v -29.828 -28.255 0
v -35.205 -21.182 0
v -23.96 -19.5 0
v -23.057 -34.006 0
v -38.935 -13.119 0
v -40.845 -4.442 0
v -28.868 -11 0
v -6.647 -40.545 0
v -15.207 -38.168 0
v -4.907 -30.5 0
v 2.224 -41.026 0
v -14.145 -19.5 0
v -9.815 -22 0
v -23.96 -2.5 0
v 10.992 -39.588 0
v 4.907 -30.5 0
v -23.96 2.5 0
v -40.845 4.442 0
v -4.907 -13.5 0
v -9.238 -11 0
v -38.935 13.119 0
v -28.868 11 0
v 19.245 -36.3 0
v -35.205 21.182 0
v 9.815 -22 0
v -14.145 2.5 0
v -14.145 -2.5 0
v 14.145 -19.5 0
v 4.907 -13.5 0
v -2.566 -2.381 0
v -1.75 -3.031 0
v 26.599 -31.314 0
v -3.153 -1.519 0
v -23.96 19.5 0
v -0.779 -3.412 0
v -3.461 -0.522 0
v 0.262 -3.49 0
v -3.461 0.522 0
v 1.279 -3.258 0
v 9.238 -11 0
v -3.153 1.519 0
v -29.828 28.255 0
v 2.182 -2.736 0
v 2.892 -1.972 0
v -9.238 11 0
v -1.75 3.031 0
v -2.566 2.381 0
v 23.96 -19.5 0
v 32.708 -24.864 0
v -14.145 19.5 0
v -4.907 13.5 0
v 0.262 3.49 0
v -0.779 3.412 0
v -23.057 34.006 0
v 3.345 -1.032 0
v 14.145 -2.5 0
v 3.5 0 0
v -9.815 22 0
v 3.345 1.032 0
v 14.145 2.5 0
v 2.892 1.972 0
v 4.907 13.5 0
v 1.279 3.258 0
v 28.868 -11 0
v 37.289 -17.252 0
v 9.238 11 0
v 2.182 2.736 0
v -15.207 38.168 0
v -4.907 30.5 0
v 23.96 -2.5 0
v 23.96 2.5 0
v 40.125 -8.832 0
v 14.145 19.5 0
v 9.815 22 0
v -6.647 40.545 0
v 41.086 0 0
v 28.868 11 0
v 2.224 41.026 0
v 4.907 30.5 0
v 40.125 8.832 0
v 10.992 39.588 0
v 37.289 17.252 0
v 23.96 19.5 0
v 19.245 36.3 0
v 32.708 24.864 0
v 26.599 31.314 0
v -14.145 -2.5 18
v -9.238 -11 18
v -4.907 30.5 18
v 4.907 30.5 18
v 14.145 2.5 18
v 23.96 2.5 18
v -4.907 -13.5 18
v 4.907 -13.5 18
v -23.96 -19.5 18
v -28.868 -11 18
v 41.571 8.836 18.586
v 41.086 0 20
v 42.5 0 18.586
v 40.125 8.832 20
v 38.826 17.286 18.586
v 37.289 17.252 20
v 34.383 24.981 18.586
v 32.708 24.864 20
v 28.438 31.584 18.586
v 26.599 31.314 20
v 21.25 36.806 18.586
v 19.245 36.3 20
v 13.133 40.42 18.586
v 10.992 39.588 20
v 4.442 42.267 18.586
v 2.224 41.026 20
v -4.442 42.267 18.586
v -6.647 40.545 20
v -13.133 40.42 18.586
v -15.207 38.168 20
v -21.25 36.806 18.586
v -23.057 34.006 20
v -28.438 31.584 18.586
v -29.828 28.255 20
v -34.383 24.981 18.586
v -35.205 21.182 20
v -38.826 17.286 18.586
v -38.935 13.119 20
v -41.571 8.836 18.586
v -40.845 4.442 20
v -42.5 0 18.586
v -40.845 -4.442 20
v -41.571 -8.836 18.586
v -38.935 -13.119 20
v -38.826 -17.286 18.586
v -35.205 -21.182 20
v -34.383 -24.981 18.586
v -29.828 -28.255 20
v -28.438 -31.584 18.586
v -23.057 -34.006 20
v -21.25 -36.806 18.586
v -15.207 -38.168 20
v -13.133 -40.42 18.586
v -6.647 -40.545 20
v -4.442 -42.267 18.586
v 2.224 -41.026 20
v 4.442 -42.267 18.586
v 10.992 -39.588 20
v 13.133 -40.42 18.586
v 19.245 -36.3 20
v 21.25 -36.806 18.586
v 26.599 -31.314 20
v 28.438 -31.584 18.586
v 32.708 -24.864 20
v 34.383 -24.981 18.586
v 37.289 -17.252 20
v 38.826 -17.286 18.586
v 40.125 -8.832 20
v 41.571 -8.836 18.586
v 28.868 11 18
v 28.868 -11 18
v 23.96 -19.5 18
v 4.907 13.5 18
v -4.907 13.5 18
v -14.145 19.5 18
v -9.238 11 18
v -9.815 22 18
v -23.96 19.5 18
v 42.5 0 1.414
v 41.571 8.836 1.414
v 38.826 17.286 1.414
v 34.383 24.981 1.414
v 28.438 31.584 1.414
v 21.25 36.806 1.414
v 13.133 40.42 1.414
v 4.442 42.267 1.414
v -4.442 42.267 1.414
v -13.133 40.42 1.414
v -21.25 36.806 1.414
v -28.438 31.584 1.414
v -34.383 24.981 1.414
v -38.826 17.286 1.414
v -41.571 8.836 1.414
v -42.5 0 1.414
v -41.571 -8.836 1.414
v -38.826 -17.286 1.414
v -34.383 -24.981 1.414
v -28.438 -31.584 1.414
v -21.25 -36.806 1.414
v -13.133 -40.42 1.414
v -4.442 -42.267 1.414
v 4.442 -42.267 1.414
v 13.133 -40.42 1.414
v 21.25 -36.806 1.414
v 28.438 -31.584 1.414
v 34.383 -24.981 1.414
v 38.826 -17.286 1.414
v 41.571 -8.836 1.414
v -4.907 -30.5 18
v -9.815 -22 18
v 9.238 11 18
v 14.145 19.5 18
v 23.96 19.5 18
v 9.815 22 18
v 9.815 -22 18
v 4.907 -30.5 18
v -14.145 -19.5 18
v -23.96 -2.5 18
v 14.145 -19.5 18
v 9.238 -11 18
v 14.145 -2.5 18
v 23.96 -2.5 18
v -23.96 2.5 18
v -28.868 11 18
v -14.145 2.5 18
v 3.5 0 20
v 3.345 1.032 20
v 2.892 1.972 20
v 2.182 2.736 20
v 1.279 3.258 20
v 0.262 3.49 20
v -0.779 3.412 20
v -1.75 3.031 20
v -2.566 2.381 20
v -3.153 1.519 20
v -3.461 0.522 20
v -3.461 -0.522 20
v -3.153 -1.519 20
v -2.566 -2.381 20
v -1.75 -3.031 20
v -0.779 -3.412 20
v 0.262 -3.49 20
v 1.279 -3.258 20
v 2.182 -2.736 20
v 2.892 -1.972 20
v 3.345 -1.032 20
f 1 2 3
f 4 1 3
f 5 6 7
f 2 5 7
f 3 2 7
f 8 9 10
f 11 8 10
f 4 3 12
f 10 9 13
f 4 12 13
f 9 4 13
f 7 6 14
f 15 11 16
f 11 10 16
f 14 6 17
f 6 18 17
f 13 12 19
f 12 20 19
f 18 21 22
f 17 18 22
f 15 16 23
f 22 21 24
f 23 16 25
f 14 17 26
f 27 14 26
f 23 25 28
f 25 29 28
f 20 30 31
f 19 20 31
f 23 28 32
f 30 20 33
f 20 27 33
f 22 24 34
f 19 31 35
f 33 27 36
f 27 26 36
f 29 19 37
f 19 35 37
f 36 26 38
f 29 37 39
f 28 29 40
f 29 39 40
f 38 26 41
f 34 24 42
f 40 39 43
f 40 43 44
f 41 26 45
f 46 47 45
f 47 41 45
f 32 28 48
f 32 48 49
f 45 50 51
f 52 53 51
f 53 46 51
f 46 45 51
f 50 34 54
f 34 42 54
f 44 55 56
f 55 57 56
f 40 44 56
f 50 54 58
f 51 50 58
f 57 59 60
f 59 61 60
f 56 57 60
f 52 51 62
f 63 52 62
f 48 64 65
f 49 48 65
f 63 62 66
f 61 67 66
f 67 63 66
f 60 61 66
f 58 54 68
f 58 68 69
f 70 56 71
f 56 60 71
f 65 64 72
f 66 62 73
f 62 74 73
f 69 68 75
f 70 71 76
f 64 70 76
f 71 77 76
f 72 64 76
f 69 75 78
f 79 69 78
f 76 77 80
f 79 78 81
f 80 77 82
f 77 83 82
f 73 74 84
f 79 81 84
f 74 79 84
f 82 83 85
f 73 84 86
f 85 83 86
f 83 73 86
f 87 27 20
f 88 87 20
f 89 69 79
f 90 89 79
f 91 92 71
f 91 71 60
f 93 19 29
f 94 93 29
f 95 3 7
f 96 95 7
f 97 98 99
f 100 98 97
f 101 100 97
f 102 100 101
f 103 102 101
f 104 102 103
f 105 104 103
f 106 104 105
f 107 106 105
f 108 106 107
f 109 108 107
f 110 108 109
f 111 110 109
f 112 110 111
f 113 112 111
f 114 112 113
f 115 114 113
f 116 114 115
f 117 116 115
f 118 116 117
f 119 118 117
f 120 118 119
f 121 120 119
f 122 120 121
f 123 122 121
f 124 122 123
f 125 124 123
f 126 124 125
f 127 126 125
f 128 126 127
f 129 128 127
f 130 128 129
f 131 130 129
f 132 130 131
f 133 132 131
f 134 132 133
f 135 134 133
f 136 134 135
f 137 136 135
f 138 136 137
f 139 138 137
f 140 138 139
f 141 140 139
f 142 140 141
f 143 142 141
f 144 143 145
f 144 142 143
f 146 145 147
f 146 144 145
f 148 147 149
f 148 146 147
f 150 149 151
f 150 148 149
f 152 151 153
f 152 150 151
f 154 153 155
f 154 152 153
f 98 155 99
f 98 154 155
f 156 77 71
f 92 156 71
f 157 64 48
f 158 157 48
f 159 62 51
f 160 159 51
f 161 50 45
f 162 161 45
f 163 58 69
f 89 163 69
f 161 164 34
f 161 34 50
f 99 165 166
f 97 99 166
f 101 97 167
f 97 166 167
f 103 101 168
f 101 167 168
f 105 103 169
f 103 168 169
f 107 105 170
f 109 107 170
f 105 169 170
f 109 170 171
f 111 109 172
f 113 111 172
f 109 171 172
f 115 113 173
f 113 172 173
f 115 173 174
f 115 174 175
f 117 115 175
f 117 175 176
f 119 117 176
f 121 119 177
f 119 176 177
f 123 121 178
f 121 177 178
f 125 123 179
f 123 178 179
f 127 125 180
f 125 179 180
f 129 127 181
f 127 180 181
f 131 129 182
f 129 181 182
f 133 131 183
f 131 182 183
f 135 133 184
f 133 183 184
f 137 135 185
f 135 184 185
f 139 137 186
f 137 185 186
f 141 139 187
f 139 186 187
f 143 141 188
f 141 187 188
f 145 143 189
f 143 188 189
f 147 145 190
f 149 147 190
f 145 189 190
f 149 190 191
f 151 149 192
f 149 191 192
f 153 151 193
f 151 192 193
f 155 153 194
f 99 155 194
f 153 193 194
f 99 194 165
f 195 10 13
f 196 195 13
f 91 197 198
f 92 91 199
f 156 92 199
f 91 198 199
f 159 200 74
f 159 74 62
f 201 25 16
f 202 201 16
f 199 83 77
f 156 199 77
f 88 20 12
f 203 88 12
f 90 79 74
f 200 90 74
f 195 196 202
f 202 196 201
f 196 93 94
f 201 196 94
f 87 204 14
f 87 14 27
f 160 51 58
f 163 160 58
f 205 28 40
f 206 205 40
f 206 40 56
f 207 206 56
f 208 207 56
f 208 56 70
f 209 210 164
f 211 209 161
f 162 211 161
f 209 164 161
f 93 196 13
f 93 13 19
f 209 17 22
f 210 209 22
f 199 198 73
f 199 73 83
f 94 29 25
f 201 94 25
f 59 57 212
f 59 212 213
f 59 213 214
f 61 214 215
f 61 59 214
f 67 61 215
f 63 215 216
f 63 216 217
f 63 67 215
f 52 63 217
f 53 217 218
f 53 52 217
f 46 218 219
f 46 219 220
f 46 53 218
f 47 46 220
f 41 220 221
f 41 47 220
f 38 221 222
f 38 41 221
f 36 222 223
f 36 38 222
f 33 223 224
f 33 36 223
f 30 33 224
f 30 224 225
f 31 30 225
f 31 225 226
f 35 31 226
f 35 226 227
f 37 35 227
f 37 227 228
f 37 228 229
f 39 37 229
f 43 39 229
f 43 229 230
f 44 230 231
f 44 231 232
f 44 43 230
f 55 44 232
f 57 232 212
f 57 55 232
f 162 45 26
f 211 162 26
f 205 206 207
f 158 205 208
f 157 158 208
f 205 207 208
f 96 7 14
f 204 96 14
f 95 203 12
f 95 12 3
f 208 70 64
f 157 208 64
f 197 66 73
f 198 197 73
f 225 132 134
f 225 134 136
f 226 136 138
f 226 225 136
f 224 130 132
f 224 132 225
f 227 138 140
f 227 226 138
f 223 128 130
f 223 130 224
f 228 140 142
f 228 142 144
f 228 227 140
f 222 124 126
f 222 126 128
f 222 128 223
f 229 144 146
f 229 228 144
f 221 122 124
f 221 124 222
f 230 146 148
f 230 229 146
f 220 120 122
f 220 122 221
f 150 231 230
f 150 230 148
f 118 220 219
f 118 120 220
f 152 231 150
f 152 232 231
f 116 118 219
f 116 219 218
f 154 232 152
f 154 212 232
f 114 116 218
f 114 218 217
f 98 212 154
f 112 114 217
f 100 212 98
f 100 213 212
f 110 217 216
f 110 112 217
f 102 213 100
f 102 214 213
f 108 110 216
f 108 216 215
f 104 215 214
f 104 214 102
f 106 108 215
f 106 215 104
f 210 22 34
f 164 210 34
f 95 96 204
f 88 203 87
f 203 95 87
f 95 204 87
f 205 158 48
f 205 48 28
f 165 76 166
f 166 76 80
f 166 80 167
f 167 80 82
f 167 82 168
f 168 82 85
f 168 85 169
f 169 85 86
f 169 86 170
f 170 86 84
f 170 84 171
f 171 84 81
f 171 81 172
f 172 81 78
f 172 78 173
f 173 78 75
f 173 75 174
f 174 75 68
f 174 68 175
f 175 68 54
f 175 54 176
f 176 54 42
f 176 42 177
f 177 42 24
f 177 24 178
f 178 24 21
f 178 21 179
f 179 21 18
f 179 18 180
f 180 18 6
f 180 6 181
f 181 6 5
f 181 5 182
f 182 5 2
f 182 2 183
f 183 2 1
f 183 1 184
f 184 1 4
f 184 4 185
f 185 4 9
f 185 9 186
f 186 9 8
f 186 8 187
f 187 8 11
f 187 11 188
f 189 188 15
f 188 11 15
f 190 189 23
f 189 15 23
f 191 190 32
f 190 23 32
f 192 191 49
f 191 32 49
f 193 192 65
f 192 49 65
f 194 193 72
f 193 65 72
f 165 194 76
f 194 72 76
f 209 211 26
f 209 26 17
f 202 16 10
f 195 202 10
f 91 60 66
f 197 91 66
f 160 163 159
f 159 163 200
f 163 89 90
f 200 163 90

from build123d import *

# Parameters (mm, degrees)
F0_R     = 42.5
F0_R_2   = 3.5
F1_DEPTH = 20
F2_START = 18
F2_DEPTH = 2
F3_SIZE  = 1.414
F4_SIZE  = 1.414


with BuildPart() as f1:
    # F0 (on Top) → F1 (new body)
    with BuildSketch(Plane.XY):
        Circle(F0_R)
        Polygon((-4.9074772881, -13.5), (4.9074772881, -13.5), (9.8149545762, -22), (4.9074772881, -30.5), (-4.9074772881, -30.5), (-9.8149545762, -22), align=None, mode=Mode.SUBTRACT)
        Polygon((-14.1450815951, -2.5), (-9.237604307, -11), (-14.1450815951, -19.5), (-23.9600361714, -19.5), (-28.8675134595, -11), (-23.9600361714, -2.5), align=None, mode=Mode.SUBTRACT)
        Polygon((9.237604307, -11), (14.1450815951, -2.5), (23.9600361714, -2.5), (28.8675134595, -11), (23.9600361714, -19.5), (14.1450815951, -19.5), align=None, mode=Mode.SUBTRACT)
        Polygon((-9.237604307, 11), (-14.1450815951, 2.5), (-23.9600361714, 2.5), (-28.8675134595, 11), (-23.9600361714, 19.5), (-14.1450815951, 19.5), align=None, mode=Mode.SUBTRACT)
        Circle(F0_R_2, mode=Mode.SUBTRACT)
        Polygon((14.1450815951, 2.5), (9.237604307, 11), (14.1450815951, 19.5), (23.9600361714, 19.5), (28.8675134595, 11), (23.9600361714, 2.5), align=None, mode=Mode.SUBTRACT)
        Polygon((9.8149545762, 22), (4.9074772881, 13.5), (-4.9074772881, 13.5), (-9.8149545762, 22), (-4.9074772881, 30.5), (4.9074772881, 30.5), align=None, mode=Mode.SUBTRACT)
    extrude(amount=F1_DEPTH)

    # F0 (on Top) → F2 (join)
    with BuildSketch(Plane.XY.offset(F2_START)):
        Polygon((-23.9600361714, 2.5), (-14.1450815951, 2.5), (-9.237604307, 11), (-14.1450815951, 19.5), (-23.9600361714, 19.5), (-28.8675134595, 11), align=None)
        Polygon((-4.9074772881, 13.5), (4.9074772881, 13.5), (9.8149545762, 22), (4.9074772881, 30.5), (-4.9074772881, 30.5), (-9.8149545762, 22), align=None)
        Polygon((14.1450815951, 19.5), (9.237604307, 11), (14.1450815951, 2.5), (23.9600361714, 2.5), (28.8675134595, 11), (23.9600361714, 19.5), align=None)
        Polygon((23.9600361714, -2.5), (14.1450815951, -2.5), (9.237604307, -11), (14.1450815951, -19.5), (23.9600361714, -19.5), (28.8675134595, -11), align=None)
        Polygon((9.8149545762, -22), (4.9074772881, -13.5), (-4.9074772881, -13.5), (-9.8149545762, -22), (-4.9074772881, -30.5), (4.9074772881, -30.5), align=None)
        Polygon((-14.1450815951, -19.5), (-9.237604307, -11), (-14.1450815951, -2.5), (-23.9600361714, -2.5), (-28.8675134595, -11), (-23.9600361714, -19.5), align=None)
    extrude(amount=F2_DEPTH)

    # F3
    f3_edges = [f1.edges().sort_by_distance(p)[0] for p in [
        (-42.5, 0, 20),
    ]]
    chamfer(f3_edges, length=F3_SIZE)

    # F4
    f4_edges = [f1.edges().sort_by_distance(p)[0] for p in [
        (-42.5, 0, 0),
    ]]
    chamfer(f4_edges, length=F4_SIZE)


solid = f1.part
